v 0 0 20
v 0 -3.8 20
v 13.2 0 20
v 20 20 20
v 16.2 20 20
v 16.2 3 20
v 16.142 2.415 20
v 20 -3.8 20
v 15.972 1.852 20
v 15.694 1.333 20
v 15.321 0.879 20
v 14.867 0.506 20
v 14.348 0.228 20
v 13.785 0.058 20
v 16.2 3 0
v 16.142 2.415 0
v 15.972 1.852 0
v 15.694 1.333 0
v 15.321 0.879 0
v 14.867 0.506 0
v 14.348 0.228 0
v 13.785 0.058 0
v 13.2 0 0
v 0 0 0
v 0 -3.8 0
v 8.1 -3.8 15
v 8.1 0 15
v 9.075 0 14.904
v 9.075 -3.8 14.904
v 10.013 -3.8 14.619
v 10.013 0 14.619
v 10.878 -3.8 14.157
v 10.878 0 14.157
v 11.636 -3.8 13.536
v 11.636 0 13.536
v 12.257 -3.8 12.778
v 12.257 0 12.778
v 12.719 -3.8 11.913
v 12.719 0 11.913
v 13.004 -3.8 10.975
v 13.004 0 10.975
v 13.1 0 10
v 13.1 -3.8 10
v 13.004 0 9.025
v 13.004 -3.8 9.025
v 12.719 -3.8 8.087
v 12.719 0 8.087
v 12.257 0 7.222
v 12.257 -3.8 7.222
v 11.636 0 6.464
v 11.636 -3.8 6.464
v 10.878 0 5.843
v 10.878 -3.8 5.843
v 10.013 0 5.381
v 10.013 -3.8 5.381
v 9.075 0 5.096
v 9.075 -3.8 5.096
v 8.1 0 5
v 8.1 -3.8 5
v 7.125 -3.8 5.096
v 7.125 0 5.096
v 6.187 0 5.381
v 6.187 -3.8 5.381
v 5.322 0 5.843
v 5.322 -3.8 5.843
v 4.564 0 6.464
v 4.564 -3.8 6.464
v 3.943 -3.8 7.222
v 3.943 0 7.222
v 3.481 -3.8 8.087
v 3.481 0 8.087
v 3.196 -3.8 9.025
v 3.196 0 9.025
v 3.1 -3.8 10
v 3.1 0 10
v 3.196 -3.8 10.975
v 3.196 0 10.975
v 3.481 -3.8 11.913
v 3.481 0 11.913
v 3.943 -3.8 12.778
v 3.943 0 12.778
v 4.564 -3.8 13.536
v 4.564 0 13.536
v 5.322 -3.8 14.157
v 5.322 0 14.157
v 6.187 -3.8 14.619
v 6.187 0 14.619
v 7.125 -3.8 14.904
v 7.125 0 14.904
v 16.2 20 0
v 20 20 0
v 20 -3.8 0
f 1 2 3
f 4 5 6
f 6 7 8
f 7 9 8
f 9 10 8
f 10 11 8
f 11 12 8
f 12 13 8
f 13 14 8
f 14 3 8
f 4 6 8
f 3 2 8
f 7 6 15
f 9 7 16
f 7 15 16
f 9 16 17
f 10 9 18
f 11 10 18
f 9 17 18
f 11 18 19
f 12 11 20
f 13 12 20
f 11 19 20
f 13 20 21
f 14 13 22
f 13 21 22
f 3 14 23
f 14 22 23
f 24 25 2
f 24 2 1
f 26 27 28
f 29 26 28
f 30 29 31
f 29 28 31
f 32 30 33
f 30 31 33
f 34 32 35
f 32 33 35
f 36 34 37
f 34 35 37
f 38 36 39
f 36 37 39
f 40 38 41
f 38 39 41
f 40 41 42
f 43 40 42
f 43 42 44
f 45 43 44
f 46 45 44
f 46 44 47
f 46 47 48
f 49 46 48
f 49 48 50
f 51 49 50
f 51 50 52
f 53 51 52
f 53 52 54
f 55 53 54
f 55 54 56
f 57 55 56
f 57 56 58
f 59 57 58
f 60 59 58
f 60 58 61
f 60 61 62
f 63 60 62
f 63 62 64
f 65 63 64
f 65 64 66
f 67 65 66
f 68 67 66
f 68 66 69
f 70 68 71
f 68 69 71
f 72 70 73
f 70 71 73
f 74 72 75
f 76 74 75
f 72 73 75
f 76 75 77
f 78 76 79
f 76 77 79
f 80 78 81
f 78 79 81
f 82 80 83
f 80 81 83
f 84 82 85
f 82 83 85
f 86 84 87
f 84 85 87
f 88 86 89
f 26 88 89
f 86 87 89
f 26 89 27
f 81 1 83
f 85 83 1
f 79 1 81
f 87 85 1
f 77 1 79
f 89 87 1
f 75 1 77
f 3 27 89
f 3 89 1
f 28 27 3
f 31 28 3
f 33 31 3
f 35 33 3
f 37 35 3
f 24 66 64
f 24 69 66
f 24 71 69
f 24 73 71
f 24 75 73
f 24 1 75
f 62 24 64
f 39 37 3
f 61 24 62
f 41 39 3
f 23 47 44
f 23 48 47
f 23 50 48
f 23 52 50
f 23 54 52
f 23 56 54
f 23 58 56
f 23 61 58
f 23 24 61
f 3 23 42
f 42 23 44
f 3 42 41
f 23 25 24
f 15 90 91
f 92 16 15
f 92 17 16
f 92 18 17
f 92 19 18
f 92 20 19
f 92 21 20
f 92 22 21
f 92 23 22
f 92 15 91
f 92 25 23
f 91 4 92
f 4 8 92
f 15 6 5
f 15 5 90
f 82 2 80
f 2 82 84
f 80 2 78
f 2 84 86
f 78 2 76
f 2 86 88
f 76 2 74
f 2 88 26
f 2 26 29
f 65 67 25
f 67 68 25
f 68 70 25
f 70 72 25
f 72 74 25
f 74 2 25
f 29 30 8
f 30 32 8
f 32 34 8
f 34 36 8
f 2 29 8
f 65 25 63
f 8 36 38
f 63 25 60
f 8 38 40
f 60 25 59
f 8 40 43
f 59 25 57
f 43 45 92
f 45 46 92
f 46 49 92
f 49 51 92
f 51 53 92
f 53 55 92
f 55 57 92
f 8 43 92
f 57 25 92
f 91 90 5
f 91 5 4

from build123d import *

# Parameters (mm, degrees)
SKETCH1_W           = 20
SKETCH1_H           = 3.8
BOSS_EXTRUDE1_DEPTH = 20
SKETCH2_W           = 3.8
SKETCH2_H           = 20
BOSS_EXTRUDE2_DEPTH = 20
SKETCH3_R           = 5
CUT_EXTRUDE1_DEPTH  = 30
FILLET1_R           = 3


with BuildPart() as part:
    # Sketch1 → Boss-Extrude1 (new body)
    with BuildSketch(Plane.XY):
        with Locations((10, -1.9)):
            Rectangle(SKETCH1_W, SKETCH1_H)
    extrude(amount=BOSS_EXTRUDE1_DEPTH)

    # Sketch2 → Boss-Extrude2 (add)
    with BuildSketch(Plane(origin=(0, 0, 0), x_dir=(1, 0, 0), z_dir=(0, 1, 0))):
        with Locations((18.1, -10)):
            Rectangle(SKETCH2_W, SKETCH2_H)
    extrude(amount=BOSS_EXTRUDE2_DEPTH)

    # Sketch3 → Cut-Extrude1 (cut)
    with BuildSketch(Plane(origin=(0, 0, 0), x_dir=(1, 0, 0), z_dir=(0, 1, 0))):
        with Locations(Location((8.1, -10, 0), (0, 0, 270))):
            Circle(SKETCH3_R)
    extrude(amount=-CUT_EXTRUDE1_DEPTH, mode=Mode.SUBTRACT)

    # Fillet1
    fillet1_edges = [part.edges().sort_by_distance(p)[0] for p in [
        (16.2, 0, 10),
    ]]
    fillet(fillet1_edges, radius=FILLET1_R)


solid = part.part
